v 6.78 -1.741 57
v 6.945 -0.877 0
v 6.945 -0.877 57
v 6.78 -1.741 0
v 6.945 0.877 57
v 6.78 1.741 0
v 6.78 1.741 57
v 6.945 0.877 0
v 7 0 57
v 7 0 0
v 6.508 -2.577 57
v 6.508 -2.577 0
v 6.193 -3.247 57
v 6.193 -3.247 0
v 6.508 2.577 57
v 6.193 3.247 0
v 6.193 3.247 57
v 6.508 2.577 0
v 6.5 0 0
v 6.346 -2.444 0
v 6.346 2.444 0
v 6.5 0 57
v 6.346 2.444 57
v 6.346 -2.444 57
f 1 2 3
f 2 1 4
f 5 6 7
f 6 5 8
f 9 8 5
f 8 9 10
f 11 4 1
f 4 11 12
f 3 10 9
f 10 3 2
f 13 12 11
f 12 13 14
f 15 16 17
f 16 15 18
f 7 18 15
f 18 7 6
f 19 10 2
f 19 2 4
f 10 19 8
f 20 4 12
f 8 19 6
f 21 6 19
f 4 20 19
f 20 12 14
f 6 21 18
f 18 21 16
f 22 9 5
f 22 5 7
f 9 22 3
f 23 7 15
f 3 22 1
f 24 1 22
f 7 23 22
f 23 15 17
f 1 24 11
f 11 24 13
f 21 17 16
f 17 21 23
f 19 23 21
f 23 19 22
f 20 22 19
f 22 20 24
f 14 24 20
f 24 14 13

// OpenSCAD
$fn = 50;


difference() {
	union() {
		cylinder(h = 57, r = 7.0000000000);
		translate(v = [-16.0000000000, 0, 0]) {
			cylinder(h = 57, r = 7.0000000000);
		}
	}
	union() {
		cylinder(h = 57, r = 3.2500000000);
		cylinder(h = 57, r = 1.8000000000);
		cylinder(h = 57, r = 1.8000000000);
		cylinder(h = 57, r = 1.8000000000);
		translate(v = [-20.5000000000, 0, 0]) {
			hull() {
				translate(v = [-3.7500000000, 0.0000000000, 0]) {
					cylinder(h = 57, r = 10.5000000000);
				}
				translate(v = [3.7500000000, 0.0000000000, 0]) {
					cylinder(h = 57, r = 10.5000000000);
				}
				translate(v = [-3.7500000000, -0.0000000000, 0]) {
					cylinder(h = 57, r = 10.5000000000);
				}
				translate(v = [3.7500000000, -0.0000000000, 0]) {
					cylinder(h = 57, r = 10.5000000000);
				}
			}
		}
		translate(v = [-13.0000000000, 0, 0.0000000000]) {
			cylinder(h = 57, r = 19.5000000000);
		}
	}
}
